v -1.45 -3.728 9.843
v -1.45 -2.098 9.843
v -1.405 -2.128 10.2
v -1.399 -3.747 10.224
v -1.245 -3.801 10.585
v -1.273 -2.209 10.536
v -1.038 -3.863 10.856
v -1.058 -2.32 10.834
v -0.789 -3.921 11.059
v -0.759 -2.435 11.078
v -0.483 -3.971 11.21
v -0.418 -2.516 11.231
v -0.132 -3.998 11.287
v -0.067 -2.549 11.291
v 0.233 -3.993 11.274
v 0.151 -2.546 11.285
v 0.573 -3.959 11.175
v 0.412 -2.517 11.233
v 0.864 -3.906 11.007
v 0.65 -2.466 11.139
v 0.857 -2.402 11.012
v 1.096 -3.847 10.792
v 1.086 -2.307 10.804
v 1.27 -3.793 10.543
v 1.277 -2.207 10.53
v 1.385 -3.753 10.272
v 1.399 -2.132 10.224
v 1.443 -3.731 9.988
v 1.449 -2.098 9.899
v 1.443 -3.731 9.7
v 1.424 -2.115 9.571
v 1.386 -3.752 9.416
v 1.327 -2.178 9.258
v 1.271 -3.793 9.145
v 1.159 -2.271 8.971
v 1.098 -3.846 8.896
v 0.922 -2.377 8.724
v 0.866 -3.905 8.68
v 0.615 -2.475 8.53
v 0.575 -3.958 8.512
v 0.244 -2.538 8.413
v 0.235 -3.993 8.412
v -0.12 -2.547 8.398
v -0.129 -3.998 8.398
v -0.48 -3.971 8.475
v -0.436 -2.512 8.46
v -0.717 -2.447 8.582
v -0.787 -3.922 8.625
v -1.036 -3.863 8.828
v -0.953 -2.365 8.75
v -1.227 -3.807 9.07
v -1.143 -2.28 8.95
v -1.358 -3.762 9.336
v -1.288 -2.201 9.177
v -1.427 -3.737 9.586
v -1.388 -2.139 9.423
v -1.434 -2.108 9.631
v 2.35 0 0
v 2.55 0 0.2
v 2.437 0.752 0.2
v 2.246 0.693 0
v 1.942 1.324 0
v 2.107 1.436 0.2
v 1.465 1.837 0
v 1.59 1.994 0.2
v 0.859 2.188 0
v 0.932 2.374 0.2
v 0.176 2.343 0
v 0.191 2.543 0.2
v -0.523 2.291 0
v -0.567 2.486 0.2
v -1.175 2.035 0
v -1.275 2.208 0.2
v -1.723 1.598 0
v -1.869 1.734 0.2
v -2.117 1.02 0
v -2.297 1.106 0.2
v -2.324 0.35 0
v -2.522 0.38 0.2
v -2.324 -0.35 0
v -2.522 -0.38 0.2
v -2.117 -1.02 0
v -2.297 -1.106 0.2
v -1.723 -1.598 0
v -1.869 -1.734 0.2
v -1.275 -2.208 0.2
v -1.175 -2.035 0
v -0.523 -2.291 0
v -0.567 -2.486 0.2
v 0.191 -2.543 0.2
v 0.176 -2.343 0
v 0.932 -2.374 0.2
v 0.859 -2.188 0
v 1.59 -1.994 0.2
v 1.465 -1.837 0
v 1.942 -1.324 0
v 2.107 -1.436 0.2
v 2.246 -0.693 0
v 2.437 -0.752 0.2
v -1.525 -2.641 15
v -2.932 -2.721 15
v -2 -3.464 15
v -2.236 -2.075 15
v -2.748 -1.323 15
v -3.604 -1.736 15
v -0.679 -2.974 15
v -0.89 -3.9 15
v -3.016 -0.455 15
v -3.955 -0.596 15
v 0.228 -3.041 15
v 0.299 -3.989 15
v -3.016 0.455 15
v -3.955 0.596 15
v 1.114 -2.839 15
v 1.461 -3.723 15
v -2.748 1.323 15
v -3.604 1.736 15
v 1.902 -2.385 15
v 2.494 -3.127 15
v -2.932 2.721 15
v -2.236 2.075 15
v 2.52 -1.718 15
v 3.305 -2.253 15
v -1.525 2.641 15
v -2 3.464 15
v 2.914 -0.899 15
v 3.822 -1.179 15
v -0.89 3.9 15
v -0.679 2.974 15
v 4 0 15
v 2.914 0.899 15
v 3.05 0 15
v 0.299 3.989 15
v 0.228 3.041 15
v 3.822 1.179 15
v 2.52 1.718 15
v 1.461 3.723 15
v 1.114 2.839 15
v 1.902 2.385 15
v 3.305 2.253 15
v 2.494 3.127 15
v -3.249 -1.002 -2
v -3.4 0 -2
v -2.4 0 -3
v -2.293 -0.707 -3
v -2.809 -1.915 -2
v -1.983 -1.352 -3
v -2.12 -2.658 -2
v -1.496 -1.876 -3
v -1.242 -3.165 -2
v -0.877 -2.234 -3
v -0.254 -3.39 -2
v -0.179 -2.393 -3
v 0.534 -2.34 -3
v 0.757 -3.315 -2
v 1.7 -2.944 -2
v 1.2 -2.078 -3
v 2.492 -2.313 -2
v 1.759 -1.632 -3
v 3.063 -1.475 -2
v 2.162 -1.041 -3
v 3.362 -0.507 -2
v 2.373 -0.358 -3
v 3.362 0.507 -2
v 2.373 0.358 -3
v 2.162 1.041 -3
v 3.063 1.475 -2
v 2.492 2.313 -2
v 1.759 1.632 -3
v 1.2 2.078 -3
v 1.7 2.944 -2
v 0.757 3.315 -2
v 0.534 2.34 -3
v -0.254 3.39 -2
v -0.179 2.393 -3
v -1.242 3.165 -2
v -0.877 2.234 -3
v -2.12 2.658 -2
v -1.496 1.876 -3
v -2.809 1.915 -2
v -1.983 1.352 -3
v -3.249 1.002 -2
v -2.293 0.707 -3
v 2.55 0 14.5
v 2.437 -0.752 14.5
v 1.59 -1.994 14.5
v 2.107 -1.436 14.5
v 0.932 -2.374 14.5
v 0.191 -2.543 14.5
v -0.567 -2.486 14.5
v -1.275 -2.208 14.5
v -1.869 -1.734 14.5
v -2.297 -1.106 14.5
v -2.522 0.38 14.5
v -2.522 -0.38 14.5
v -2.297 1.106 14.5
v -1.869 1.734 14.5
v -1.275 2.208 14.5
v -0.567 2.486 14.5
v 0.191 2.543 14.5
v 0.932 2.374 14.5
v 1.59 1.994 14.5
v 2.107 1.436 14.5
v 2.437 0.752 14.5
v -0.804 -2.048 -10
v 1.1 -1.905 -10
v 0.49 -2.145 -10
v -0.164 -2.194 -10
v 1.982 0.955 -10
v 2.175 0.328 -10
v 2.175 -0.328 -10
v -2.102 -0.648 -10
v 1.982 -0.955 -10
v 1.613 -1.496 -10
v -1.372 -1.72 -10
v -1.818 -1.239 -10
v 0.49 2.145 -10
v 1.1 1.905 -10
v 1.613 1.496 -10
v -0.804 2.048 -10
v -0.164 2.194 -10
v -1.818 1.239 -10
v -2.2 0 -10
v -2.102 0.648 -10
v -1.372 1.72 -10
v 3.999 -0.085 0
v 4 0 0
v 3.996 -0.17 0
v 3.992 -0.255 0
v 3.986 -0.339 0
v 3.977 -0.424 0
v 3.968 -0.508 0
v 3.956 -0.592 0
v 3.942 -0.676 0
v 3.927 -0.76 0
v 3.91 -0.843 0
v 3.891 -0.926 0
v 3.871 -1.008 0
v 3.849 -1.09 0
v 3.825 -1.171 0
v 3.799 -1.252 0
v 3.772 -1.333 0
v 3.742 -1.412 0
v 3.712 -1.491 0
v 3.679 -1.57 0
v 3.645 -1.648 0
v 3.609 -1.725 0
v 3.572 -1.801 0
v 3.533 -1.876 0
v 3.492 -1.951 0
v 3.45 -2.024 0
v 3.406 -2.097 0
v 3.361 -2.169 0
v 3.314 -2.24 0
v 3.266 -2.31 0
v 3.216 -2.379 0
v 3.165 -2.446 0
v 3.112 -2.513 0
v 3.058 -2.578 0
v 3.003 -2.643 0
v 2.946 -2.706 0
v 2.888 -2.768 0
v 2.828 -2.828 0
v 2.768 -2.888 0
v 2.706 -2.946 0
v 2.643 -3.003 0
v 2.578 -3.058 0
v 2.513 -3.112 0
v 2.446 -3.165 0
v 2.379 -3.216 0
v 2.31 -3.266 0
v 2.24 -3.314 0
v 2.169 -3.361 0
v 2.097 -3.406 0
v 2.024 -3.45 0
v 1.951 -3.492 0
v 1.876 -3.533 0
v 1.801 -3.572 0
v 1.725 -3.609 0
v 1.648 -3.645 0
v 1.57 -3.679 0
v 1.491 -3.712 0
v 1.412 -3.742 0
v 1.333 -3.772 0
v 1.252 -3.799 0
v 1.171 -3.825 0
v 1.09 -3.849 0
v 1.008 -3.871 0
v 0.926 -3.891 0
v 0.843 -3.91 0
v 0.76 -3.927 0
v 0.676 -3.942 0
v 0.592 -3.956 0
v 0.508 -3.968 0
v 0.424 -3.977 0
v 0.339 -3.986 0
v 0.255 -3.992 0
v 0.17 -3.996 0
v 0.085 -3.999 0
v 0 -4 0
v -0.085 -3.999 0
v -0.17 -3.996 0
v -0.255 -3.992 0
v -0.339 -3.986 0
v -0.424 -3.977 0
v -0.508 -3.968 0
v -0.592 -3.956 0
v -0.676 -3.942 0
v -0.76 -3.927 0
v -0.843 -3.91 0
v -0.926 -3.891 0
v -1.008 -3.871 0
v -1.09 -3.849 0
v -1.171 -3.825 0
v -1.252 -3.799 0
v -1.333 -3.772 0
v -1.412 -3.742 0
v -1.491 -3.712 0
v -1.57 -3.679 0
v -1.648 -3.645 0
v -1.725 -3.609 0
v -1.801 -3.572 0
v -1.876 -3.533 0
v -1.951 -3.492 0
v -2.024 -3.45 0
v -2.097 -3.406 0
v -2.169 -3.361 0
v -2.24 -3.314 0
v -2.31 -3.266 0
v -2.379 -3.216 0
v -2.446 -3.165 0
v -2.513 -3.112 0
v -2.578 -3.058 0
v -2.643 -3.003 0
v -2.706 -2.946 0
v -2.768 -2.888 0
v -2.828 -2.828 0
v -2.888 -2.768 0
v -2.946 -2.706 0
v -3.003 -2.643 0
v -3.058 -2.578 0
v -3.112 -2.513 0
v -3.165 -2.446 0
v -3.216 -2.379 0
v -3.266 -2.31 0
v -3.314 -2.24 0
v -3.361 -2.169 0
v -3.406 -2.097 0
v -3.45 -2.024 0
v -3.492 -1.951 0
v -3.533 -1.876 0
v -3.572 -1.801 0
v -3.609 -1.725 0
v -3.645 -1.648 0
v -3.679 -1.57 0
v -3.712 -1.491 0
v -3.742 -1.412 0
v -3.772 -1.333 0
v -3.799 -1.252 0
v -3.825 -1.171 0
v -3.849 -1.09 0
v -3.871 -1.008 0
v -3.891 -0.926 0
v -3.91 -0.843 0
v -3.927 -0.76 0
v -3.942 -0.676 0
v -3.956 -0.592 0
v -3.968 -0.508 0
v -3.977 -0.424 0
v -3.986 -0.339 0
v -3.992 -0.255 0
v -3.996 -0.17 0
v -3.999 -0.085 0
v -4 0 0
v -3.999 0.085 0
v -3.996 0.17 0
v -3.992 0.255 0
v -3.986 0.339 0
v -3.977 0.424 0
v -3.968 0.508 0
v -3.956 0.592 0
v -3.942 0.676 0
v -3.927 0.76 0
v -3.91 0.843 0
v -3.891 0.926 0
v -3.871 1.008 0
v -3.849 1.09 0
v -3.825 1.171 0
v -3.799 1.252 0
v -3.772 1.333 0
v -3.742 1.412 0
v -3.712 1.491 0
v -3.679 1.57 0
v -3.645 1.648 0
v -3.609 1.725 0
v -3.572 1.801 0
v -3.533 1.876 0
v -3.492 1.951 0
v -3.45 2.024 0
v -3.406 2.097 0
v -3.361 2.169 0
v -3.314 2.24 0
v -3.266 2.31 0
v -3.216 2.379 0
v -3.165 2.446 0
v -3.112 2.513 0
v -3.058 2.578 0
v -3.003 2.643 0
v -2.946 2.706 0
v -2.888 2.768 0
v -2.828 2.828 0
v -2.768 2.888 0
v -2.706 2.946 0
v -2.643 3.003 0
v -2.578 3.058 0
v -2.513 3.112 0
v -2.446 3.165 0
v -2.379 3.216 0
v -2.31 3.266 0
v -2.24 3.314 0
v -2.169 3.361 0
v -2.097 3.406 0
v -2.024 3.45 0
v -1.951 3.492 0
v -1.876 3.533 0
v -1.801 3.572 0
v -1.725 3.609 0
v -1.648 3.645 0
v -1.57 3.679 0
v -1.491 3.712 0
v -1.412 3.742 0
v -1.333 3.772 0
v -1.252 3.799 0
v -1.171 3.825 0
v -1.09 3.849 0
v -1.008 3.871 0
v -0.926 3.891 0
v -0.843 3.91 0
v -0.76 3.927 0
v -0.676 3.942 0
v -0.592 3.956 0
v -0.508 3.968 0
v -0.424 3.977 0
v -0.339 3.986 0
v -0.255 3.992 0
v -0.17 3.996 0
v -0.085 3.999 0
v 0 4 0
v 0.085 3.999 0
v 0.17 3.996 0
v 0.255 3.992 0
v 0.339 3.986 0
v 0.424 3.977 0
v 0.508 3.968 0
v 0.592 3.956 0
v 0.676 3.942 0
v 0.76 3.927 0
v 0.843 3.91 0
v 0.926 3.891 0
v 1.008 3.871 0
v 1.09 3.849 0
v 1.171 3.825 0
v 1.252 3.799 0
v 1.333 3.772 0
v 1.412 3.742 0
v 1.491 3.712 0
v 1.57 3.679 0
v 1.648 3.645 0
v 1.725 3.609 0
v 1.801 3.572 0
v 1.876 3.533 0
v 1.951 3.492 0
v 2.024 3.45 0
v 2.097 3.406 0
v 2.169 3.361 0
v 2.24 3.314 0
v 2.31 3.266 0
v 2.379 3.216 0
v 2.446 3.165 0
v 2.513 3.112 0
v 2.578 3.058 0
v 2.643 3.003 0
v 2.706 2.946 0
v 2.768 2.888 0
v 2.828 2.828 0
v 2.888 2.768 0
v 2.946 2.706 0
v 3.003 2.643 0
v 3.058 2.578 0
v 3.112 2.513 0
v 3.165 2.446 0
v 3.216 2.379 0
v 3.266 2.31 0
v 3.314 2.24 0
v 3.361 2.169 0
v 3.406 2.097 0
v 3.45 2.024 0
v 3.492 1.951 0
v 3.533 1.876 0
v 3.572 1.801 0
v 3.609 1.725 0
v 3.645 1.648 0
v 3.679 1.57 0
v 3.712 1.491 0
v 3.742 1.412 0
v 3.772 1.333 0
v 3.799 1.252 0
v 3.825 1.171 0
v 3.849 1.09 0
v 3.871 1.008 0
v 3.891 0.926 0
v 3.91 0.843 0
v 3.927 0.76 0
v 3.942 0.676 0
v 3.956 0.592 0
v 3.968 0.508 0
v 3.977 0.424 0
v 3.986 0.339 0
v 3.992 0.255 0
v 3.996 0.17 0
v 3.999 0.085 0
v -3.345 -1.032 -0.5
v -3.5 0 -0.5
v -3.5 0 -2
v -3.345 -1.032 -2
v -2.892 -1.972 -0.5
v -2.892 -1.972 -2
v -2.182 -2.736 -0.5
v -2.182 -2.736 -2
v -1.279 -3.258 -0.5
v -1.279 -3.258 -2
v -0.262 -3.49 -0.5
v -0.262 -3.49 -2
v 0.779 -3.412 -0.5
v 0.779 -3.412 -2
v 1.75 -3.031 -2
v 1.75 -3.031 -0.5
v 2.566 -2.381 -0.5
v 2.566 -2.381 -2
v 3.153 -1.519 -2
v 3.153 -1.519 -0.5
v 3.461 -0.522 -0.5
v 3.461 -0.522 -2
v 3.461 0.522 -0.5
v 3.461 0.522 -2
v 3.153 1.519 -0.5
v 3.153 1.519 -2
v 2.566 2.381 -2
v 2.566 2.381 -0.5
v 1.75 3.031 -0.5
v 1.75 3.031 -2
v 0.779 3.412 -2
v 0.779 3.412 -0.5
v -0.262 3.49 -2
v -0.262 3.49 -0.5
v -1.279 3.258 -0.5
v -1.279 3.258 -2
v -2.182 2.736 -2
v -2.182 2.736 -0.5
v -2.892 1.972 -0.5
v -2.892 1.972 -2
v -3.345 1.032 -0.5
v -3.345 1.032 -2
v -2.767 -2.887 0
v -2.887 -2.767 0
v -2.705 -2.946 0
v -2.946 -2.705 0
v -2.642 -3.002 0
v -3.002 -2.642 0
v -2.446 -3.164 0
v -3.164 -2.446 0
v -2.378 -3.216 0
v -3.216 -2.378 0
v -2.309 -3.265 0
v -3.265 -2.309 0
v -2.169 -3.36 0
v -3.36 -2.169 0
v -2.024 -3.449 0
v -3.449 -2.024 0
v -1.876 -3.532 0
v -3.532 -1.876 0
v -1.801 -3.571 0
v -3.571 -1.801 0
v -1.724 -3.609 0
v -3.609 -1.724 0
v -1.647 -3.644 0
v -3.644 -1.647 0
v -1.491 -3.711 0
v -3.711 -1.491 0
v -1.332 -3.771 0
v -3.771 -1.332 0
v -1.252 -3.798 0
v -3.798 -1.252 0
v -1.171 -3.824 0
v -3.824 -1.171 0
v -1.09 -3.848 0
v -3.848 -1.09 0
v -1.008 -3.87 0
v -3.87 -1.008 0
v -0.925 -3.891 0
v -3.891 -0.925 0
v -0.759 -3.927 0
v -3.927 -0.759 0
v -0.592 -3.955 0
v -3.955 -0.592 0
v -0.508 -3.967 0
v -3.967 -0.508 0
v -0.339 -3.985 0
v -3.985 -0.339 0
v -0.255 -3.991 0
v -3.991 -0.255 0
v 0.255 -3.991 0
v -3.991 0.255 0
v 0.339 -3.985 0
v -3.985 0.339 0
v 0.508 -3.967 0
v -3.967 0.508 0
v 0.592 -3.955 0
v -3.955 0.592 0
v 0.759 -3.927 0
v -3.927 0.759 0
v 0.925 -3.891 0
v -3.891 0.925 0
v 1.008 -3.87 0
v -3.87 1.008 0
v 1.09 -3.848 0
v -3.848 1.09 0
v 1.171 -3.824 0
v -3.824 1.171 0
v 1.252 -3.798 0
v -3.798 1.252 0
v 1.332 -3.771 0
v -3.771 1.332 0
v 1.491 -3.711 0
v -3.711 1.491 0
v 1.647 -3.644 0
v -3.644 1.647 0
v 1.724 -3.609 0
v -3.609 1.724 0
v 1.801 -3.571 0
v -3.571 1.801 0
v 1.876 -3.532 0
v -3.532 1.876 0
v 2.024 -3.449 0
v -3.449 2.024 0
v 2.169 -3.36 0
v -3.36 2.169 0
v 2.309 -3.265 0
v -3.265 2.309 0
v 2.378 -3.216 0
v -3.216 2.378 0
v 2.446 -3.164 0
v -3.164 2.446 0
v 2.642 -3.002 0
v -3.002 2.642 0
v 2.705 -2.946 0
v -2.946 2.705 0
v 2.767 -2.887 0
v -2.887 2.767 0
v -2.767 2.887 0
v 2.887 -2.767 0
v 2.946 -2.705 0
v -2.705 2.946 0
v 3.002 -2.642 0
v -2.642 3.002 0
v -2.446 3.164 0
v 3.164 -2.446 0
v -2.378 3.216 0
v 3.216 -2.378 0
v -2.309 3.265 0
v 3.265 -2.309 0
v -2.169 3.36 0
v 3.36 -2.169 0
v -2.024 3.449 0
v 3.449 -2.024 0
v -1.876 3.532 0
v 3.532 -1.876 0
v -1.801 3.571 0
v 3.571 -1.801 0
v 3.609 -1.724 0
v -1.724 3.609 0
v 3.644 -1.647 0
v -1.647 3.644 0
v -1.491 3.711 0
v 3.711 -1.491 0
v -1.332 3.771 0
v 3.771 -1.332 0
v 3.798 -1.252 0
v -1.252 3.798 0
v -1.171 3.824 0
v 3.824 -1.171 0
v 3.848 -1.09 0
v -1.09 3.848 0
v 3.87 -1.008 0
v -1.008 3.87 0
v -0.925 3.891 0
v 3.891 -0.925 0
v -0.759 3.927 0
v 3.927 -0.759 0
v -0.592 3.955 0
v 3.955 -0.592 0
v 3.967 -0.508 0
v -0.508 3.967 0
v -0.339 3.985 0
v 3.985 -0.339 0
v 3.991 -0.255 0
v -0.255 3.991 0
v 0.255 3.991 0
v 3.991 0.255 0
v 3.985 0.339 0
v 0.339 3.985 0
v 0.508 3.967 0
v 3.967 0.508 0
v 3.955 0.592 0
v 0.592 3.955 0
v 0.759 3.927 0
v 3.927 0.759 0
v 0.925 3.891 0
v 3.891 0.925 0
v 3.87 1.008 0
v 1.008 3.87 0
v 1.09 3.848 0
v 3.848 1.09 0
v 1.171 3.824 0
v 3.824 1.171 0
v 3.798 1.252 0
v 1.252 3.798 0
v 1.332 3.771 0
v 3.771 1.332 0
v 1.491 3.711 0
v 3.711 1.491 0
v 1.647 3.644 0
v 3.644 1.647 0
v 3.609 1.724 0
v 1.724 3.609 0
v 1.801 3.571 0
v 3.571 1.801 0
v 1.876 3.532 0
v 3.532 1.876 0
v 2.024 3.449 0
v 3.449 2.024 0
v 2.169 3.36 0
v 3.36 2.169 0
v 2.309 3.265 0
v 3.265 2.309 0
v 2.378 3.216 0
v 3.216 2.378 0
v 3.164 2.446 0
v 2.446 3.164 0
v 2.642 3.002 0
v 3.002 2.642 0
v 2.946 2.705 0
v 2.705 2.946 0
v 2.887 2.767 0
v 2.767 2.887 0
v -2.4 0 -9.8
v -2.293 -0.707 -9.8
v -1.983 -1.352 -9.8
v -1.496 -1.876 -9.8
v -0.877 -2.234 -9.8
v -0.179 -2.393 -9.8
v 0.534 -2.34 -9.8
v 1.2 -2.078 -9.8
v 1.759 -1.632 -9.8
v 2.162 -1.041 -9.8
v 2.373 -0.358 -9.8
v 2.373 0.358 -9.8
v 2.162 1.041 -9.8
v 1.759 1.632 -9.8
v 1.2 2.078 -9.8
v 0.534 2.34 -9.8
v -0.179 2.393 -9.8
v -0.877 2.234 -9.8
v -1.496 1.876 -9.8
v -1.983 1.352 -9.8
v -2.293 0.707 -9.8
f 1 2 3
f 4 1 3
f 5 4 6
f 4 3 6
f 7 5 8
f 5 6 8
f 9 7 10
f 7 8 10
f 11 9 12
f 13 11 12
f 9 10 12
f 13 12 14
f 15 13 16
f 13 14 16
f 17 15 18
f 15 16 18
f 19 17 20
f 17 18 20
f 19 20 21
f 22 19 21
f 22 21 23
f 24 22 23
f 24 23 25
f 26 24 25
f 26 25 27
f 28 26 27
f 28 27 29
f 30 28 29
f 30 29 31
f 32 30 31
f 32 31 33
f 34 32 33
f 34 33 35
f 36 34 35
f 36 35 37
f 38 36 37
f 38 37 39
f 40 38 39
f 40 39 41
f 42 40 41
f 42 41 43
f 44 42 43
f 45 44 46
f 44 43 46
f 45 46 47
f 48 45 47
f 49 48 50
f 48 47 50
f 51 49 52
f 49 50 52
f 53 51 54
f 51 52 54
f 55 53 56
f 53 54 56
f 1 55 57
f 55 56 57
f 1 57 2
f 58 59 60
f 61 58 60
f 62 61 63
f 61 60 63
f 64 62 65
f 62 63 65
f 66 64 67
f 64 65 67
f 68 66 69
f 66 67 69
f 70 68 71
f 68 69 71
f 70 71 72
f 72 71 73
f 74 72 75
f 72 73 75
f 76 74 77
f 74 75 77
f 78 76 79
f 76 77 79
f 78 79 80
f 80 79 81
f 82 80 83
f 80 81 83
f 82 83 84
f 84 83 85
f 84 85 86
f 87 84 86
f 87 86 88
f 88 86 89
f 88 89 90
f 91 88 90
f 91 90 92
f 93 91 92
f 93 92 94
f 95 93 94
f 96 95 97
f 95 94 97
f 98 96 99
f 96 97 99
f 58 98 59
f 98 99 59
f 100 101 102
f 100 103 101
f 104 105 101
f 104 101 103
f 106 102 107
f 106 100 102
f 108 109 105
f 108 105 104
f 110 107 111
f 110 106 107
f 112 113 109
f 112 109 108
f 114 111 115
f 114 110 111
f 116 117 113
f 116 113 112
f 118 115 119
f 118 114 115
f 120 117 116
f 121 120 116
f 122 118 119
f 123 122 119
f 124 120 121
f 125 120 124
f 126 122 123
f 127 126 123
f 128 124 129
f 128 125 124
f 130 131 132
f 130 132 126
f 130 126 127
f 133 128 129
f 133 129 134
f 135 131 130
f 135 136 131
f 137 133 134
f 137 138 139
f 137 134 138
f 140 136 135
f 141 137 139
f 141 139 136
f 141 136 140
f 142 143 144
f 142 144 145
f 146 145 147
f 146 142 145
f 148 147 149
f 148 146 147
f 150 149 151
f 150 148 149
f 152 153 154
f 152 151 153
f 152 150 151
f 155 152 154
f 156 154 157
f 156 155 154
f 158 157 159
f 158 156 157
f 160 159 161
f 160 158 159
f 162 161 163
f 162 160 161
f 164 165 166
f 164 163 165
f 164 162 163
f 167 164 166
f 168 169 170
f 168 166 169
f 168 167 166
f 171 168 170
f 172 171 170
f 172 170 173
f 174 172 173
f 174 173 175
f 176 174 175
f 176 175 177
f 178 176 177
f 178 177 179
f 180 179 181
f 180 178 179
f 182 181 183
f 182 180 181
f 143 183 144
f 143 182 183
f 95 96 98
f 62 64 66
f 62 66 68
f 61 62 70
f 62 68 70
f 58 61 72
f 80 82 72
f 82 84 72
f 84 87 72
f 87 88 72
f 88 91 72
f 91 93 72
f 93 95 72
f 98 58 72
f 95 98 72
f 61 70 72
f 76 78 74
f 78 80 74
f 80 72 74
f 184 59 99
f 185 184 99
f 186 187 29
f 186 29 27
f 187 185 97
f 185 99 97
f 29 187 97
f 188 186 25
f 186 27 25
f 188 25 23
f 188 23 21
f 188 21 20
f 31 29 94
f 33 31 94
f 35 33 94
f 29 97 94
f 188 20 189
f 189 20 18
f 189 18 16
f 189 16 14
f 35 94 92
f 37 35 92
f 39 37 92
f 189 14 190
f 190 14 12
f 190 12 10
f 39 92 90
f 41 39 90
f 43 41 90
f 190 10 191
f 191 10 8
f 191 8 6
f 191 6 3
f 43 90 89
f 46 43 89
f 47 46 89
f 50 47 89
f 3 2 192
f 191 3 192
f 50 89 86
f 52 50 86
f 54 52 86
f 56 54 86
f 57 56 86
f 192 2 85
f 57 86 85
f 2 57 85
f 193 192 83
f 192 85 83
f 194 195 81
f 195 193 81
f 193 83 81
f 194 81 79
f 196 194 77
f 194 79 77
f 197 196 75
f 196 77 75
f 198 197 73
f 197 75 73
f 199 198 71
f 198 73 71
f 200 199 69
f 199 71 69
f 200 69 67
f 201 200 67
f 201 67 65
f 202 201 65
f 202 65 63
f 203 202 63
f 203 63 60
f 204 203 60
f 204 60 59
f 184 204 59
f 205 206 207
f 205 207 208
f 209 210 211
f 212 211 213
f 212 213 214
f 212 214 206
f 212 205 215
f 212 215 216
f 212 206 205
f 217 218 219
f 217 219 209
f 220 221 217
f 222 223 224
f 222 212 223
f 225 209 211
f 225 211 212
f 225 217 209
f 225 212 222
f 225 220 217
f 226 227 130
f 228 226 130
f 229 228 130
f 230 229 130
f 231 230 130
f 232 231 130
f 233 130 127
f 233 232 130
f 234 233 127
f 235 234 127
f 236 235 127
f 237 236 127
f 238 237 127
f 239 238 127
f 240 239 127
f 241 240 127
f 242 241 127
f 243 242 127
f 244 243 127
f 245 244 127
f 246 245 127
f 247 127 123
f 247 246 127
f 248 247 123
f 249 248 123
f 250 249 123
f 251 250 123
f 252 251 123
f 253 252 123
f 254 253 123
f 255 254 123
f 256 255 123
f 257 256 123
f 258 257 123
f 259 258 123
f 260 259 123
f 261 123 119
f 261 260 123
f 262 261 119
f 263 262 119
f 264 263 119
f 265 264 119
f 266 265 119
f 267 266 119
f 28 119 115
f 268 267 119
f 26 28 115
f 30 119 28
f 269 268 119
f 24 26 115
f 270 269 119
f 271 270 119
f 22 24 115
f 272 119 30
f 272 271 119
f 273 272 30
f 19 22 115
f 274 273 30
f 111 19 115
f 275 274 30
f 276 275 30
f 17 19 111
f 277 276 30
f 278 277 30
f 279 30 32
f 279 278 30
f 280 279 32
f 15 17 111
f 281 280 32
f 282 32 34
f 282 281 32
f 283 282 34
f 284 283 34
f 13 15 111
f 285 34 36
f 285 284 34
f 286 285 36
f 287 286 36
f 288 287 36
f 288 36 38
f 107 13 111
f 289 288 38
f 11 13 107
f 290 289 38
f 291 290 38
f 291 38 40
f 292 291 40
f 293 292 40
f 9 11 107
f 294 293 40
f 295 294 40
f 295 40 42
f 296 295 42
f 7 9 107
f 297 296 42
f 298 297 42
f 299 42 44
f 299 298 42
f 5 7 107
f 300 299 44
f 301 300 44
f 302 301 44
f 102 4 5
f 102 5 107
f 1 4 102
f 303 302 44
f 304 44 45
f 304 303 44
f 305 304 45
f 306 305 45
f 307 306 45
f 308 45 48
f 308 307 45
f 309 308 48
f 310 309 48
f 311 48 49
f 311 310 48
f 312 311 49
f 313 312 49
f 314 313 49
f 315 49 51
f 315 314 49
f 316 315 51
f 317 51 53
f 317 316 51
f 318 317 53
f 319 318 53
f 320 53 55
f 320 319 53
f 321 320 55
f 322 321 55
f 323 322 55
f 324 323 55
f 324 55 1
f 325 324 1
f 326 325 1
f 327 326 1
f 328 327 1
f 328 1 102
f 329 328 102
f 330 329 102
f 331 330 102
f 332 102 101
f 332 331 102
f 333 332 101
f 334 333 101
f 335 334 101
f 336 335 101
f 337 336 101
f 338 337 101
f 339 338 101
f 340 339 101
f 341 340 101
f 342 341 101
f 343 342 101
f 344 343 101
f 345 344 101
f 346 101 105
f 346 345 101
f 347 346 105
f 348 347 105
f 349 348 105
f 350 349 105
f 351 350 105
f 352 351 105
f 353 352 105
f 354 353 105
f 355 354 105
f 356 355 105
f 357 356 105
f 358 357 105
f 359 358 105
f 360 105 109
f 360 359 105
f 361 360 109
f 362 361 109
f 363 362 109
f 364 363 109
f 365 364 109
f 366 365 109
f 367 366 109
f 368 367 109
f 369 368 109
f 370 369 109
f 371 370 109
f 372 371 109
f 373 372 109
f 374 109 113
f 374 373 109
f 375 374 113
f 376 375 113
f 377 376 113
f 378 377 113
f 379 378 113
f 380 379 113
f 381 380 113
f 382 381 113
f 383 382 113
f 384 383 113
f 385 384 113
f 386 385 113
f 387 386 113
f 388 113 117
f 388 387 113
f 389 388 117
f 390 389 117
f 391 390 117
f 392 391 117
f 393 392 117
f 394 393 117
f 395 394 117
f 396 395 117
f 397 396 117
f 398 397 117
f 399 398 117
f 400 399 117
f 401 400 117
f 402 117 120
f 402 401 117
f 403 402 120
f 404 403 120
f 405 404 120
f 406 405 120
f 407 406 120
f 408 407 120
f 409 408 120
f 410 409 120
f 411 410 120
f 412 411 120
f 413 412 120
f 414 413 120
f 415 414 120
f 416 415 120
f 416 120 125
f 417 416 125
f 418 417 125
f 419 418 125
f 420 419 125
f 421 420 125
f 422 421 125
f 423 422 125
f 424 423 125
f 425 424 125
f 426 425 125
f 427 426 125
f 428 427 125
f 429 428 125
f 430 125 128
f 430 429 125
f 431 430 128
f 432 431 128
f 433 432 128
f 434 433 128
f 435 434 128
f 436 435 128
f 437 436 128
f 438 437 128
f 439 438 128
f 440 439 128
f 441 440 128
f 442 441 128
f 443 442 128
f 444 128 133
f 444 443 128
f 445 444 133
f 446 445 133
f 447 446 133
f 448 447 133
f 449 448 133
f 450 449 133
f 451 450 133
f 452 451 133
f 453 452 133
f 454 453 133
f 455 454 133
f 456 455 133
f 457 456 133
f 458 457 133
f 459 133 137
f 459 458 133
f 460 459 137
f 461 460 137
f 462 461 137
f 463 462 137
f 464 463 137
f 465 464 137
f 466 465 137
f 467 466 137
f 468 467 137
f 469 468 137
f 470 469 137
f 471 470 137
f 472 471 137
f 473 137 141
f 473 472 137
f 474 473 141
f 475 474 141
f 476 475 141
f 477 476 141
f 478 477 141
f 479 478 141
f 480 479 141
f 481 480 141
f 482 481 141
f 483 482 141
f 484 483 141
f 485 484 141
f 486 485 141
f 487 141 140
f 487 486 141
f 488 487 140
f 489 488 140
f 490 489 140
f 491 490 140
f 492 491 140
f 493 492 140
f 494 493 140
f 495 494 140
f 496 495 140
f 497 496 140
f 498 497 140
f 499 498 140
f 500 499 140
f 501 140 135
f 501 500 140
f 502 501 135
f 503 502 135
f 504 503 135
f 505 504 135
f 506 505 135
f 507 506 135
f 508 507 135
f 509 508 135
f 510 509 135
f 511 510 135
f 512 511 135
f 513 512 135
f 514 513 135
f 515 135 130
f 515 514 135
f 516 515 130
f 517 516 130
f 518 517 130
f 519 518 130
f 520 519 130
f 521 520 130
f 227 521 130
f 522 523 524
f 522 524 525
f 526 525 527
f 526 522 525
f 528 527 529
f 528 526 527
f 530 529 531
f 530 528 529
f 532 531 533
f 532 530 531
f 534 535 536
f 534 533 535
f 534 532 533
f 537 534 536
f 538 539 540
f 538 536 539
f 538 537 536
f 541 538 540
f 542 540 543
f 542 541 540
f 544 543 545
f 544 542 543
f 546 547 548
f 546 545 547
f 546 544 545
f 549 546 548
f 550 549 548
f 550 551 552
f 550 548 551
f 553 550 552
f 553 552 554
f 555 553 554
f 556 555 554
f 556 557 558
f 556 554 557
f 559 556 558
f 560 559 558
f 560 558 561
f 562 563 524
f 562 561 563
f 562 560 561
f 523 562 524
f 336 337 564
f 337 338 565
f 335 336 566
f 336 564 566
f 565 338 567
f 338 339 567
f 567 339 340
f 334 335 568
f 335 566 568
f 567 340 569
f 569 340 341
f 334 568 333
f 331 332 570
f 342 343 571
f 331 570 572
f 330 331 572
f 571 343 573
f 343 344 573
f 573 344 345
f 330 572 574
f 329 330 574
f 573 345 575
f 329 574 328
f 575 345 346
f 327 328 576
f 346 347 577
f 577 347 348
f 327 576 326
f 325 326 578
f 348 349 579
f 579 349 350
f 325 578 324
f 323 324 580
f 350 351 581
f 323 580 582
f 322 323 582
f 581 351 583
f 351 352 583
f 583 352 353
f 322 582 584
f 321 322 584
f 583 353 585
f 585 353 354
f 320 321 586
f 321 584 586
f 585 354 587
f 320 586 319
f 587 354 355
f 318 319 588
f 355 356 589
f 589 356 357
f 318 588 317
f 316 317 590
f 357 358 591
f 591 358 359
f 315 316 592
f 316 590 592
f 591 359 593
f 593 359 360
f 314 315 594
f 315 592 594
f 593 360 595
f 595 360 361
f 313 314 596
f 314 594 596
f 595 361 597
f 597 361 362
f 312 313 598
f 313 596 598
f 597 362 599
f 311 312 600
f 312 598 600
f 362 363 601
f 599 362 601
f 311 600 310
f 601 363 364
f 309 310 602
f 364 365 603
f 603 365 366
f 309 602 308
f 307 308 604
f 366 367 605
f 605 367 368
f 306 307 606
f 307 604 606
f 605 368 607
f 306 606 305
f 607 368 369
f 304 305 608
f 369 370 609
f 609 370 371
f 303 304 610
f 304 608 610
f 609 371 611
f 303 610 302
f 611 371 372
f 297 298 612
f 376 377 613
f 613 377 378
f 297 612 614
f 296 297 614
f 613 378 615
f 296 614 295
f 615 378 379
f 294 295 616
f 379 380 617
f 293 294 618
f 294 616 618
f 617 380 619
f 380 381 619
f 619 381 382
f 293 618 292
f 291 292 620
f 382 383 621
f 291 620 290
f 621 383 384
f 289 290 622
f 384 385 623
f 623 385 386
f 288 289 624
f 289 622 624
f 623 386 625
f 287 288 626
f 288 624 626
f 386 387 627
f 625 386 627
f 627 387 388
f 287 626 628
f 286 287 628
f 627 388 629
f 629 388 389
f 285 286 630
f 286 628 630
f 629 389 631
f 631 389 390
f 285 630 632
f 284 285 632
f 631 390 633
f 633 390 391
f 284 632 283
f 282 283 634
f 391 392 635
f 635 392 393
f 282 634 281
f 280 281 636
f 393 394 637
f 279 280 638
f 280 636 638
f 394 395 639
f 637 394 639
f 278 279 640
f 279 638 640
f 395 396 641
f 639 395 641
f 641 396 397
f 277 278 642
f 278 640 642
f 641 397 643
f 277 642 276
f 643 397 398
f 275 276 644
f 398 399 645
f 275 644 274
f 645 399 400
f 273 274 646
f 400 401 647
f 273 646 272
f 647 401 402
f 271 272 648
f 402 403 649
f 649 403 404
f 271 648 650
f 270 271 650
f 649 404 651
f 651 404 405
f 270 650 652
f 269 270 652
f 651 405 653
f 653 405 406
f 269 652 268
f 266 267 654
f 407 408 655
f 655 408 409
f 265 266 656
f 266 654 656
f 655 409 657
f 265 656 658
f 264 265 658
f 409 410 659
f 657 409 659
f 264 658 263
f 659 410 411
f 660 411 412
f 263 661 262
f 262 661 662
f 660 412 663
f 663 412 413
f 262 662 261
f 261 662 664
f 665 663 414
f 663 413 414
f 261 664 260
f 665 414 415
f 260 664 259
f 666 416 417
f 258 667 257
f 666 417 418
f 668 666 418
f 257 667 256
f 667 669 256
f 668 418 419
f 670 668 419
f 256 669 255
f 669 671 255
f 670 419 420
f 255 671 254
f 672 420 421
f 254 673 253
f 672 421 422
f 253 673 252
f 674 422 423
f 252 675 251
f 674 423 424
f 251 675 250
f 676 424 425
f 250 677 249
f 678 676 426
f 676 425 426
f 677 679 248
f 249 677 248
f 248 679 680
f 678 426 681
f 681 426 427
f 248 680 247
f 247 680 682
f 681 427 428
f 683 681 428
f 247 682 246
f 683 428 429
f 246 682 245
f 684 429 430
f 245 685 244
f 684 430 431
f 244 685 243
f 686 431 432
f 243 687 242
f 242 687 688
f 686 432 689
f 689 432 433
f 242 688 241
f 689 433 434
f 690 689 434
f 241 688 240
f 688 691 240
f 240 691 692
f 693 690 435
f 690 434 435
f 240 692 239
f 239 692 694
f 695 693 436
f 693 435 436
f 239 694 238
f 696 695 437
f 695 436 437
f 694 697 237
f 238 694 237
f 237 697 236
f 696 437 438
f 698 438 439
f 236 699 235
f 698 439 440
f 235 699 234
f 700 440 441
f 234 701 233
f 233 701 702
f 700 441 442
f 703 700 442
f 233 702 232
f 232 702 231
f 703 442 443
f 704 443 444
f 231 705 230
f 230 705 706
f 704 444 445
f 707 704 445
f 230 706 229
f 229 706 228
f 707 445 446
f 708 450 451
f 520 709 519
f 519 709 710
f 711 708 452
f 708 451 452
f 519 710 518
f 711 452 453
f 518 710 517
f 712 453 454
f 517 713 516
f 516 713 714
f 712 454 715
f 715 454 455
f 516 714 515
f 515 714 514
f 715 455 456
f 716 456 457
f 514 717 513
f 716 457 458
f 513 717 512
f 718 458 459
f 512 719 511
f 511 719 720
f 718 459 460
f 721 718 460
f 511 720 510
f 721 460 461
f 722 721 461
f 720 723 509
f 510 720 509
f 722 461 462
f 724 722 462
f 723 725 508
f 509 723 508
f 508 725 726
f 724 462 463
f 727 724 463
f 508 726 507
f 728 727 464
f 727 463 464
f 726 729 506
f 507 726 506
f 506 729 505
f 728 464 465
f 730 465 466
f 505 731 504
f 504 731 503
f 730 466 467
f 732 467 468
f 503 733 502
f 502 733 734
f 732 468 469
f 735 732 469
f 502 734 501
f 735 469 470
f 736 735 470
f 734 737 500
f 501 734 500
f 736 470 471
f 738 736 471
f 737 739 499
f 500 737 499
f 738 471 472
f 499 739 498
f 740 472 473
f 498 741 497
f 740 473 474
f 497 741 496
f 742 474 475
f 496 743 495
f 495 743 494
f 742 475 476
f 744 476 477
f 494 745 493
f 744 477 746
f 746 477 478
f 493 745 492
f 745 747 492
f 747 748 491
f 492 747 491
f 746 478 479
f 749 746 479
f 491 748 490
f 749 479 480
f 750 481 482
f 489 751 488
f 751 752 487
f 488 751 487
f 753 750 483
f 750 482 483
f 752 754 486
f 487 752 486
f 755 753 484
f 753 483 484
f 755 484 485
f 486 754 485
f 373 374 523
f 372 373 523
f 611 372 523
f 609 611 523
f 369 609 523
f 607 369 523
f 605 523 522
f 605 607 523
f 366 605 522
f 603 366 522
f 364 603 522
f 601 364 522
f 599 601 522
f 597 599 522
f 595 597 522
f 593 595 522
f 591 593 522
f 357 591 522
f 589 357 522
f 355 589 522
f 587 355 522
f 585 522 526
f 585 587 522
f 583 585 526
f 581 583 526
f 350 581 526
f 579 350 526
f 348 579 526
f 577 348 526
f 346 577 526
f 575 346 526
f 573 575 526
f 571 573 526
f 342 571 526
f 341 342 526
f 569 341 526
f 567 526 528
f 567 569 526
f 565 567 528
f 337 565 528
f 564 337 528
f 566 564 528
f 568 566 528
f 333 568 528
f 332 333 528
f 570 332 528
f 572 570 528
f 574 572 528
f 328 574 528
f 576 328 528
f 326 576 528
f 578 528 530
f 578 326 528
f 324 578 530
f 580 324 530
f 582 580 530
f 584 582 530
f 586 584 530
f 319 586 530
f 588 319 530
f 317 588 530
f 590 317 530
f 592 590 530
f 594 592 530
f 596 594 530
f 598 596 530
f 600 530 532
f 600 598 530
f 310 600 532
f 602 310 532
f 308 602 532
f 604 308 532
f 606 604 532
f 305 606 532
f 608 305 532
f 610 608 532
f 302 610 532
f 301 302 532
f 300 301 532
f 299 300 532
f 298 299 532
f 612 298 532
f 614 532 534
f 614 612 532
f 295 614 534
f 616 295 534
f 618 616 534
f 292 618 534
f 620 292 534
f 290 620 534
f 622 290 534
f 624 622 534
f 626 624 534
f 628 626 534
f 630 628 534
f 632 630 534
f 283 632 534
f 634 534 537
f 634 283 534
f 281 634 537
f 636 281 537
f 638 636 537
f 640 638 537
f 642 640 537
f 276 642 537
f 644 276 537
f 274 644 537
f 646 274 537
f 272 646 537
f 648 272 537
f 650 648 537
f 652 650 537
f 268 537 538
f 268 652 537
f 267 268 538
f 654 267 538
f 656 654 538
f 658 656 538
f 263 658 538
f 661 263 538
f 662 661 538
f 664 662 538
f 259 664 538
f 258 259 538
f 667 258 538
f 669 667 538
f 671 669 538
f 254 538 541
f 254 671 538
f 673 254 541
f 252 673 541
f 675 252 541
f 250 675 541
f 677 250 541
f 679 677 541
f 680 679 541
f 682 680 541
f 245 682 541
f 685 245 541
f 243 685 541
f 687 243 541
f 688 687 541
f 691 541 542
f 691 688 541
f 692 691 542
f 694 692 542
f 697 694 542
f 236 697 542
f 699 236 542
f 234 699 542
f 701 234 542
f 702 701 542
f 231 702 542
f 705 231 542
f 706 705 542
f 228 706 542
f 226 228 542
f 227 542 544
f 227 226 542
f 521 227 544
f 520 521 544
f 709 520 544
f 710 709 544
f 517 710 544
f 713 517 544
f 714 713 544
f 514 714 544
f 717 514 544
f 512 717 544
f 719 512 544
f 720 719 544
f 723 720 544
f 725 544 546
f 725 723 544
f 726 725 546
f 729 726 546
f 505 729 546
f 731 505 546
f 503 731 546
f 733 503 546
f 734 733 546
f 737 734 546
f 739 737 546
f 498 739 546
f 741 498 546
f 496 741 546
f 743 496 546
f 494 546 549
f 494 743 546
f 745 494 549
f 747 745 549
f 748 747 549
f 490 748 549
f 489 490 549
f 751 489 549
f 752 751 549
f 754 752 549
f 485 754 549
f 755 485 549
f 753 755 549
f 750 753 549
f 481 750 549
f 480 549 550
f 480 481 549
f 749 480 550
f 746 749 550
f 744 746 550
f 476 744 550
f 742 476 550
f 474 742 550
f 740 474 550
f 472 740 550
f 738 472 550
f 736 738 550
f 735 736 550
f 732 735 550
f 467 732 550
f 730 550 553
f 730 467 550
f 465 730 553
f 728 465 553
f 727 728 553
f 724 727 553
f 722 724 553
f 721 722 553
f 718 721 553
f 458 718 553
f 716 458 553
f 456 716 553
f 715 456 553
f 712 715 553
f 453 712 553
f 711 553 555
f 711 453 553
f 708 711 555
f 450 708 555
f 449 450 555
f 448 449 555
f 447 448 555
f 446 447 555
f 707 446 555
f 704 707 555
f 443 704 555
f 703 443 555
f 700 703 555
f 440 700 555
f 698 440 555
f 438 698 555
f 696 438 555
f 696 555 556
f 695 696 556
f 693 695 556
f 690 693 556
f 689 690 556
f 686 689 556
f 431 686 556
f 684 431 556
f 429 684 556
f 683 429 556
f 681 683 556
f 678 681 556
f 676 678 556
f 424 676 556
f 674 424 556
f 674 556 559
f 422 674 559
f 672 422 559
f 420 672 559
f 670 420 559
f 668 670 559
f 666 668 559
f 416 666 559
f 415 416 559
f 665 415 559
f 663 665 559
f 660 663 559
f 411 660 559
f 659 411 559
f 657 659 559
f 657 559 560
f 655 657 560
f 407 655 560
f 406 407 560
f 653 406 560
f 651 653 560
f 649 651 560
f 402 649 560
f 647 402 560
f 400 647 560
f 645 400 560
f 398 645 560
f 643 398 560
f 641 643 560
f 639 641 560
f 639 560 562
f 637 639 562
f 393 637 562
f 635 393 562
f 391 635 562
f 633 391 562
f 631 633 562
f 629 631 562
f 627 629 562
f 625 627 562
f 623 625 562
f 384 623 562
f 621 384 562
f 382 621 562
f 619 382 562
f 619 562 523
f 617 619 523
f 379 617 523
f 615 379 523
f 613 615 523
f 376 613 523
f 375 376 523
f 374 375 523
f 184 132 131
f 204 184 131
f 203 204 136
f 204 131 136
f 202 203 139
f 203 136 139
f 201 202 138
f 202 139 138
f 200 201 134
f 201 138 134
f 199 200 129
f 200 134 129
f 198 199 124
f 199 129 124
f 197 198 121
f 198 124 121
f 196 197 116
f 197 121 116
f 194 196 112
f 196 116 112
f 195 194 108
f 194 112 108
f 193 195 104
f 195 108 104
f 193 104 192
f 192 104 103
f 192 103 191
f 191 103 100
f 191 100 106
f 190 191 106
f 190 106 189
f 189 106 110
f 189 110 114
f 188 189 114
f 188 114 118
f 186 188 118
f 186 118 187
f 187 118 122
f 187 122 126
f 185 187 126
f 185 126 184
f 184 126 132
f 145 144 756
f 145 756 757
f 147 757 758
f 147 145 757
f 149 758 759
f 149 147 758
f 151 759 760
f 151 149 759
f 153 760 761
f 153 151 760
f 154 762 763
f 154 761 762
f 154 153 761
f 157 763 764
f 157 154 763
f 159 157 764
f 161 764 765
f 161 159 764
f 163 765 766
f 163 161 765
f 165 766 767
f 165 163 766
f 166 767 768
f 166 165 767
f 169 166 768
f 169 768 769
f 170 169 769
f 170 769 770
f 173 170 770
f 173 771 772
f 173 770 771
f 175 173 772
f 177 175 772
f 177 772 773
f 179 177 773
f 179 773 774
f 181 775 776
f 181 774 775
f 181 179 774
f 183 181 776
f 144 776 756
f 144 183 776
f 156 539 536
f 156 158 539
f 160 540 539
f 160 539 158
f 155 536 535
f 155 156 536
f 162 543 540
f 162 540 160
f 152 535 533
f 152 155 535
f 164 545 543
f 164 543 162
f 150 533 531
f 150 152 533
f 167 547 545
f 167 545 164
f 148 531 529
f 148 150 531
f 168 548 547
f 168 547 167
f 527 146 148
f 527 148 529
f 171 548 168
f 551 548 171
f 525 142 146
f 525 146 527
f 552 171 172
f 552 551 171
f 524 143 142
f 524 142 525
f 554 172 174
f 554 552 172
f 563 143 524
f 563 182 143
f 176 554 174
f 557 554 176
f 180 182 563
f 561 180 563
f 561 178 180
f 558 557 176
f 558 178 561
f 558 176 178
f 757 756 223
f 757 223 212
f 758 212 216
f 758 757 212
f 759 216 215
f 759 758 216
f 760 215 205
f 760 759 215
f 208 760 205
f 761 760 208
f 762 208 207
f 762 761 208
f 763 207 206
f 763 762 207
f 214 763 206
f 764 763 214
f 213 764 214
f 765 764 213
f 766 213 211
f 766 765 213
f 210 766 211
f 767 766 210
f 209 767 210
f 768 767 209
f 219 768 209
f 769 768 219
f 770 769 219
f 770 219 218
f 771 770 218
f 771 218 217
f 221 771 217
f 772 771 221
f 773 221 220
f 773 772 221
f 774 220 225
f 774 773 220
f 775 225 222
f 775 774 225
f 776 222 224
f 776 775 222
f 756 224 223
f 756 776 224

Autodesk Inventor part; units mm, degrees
ref_plane "YZ Plane" through (0, 0, 0) normal (1, 0, 0) x (0, 1, 0)
ref_plane "XZ Plane" through (0, 0, 0) normal (0, 1, 0) x (-1, 0, 0)
ref_plane "XY Plane" through (0, 0, 0) normal (0, 0, 1) x (1, 0, 0)
sketch "Sketch1" plane through (0, 0, 0) normal (0, 0, 1) x (1, 0, 0)
  circle A0 centre (0, 0) radius 2.55
  circle A1 centre (0, 0) radius 4
  dimension "d0" = 5.1
  dimension "d1" = 8
extrude "Extrusion1" add sketch "Sketch1" along normal blind 15
sketch "Sketch2" plane through (0, 0, 0) normal (0, 0, -1) x (-1, 0, 0)
  circle A0 centre (0, 0) radius 2.4
  circle A1 centre (0, 0) radius 3.5
  dimension "d4" = 4.8
  dimension "d5" = 7
extrude "Extrusion2" add sketch "Sketch2" along normal blind 10 contours A0
extrude "Extrusion3" add sketch "Sketch2" along normal blind 2
chamfer "Chamfer1" distance 0.5 angle 45 1 edges at (3.5, 0, 0)
chamfer "Chamfer2" distance 1 angle 45 1 edges at (2.4, 0, -2)
chamfer "Chamfer3" distance 0.2 angle 45 1 edges at (-2.55, 0, 0)
chamfer "Chamfer4" distance 0.5 angle 45 1 edges at (-2.55, 0, 15)
sketch "Sketch3" plane through (0, 0, 0) normal (0, 1, 0) x (-1, 0, 0)
  circle A0 centre (0, 9.8427) radius 1.45
  point P0 (0, 0)
  dimension "d22" = 2.9
extrude "Extrusion4" cut sketch "Sketch3" against normal blind 8
chamfer "Chamfer5" distance 0.2 angle 45 1 edges at (2.4, 0, -10)
equation "\"BendRadius\" = Thickness"
equation "\"BendReliefWidth\" = Thickness"
equation "\"BendReliefDepth\" = 0.5 * Thickness"
equation "\"CornerReliefSize\" = 4 * Thickness"
equation "\"MinimumRemnant\" = 2 * Thickness"
equation "\"TransitionRadius\" = BendRadius"
equation "\"JacobiRadiusSize\" = BendRadius"
equation "\"GapSize\" = Thickness"
equation "\"Thickness\" = 0.5"
properties part number "khới nối cứng"
